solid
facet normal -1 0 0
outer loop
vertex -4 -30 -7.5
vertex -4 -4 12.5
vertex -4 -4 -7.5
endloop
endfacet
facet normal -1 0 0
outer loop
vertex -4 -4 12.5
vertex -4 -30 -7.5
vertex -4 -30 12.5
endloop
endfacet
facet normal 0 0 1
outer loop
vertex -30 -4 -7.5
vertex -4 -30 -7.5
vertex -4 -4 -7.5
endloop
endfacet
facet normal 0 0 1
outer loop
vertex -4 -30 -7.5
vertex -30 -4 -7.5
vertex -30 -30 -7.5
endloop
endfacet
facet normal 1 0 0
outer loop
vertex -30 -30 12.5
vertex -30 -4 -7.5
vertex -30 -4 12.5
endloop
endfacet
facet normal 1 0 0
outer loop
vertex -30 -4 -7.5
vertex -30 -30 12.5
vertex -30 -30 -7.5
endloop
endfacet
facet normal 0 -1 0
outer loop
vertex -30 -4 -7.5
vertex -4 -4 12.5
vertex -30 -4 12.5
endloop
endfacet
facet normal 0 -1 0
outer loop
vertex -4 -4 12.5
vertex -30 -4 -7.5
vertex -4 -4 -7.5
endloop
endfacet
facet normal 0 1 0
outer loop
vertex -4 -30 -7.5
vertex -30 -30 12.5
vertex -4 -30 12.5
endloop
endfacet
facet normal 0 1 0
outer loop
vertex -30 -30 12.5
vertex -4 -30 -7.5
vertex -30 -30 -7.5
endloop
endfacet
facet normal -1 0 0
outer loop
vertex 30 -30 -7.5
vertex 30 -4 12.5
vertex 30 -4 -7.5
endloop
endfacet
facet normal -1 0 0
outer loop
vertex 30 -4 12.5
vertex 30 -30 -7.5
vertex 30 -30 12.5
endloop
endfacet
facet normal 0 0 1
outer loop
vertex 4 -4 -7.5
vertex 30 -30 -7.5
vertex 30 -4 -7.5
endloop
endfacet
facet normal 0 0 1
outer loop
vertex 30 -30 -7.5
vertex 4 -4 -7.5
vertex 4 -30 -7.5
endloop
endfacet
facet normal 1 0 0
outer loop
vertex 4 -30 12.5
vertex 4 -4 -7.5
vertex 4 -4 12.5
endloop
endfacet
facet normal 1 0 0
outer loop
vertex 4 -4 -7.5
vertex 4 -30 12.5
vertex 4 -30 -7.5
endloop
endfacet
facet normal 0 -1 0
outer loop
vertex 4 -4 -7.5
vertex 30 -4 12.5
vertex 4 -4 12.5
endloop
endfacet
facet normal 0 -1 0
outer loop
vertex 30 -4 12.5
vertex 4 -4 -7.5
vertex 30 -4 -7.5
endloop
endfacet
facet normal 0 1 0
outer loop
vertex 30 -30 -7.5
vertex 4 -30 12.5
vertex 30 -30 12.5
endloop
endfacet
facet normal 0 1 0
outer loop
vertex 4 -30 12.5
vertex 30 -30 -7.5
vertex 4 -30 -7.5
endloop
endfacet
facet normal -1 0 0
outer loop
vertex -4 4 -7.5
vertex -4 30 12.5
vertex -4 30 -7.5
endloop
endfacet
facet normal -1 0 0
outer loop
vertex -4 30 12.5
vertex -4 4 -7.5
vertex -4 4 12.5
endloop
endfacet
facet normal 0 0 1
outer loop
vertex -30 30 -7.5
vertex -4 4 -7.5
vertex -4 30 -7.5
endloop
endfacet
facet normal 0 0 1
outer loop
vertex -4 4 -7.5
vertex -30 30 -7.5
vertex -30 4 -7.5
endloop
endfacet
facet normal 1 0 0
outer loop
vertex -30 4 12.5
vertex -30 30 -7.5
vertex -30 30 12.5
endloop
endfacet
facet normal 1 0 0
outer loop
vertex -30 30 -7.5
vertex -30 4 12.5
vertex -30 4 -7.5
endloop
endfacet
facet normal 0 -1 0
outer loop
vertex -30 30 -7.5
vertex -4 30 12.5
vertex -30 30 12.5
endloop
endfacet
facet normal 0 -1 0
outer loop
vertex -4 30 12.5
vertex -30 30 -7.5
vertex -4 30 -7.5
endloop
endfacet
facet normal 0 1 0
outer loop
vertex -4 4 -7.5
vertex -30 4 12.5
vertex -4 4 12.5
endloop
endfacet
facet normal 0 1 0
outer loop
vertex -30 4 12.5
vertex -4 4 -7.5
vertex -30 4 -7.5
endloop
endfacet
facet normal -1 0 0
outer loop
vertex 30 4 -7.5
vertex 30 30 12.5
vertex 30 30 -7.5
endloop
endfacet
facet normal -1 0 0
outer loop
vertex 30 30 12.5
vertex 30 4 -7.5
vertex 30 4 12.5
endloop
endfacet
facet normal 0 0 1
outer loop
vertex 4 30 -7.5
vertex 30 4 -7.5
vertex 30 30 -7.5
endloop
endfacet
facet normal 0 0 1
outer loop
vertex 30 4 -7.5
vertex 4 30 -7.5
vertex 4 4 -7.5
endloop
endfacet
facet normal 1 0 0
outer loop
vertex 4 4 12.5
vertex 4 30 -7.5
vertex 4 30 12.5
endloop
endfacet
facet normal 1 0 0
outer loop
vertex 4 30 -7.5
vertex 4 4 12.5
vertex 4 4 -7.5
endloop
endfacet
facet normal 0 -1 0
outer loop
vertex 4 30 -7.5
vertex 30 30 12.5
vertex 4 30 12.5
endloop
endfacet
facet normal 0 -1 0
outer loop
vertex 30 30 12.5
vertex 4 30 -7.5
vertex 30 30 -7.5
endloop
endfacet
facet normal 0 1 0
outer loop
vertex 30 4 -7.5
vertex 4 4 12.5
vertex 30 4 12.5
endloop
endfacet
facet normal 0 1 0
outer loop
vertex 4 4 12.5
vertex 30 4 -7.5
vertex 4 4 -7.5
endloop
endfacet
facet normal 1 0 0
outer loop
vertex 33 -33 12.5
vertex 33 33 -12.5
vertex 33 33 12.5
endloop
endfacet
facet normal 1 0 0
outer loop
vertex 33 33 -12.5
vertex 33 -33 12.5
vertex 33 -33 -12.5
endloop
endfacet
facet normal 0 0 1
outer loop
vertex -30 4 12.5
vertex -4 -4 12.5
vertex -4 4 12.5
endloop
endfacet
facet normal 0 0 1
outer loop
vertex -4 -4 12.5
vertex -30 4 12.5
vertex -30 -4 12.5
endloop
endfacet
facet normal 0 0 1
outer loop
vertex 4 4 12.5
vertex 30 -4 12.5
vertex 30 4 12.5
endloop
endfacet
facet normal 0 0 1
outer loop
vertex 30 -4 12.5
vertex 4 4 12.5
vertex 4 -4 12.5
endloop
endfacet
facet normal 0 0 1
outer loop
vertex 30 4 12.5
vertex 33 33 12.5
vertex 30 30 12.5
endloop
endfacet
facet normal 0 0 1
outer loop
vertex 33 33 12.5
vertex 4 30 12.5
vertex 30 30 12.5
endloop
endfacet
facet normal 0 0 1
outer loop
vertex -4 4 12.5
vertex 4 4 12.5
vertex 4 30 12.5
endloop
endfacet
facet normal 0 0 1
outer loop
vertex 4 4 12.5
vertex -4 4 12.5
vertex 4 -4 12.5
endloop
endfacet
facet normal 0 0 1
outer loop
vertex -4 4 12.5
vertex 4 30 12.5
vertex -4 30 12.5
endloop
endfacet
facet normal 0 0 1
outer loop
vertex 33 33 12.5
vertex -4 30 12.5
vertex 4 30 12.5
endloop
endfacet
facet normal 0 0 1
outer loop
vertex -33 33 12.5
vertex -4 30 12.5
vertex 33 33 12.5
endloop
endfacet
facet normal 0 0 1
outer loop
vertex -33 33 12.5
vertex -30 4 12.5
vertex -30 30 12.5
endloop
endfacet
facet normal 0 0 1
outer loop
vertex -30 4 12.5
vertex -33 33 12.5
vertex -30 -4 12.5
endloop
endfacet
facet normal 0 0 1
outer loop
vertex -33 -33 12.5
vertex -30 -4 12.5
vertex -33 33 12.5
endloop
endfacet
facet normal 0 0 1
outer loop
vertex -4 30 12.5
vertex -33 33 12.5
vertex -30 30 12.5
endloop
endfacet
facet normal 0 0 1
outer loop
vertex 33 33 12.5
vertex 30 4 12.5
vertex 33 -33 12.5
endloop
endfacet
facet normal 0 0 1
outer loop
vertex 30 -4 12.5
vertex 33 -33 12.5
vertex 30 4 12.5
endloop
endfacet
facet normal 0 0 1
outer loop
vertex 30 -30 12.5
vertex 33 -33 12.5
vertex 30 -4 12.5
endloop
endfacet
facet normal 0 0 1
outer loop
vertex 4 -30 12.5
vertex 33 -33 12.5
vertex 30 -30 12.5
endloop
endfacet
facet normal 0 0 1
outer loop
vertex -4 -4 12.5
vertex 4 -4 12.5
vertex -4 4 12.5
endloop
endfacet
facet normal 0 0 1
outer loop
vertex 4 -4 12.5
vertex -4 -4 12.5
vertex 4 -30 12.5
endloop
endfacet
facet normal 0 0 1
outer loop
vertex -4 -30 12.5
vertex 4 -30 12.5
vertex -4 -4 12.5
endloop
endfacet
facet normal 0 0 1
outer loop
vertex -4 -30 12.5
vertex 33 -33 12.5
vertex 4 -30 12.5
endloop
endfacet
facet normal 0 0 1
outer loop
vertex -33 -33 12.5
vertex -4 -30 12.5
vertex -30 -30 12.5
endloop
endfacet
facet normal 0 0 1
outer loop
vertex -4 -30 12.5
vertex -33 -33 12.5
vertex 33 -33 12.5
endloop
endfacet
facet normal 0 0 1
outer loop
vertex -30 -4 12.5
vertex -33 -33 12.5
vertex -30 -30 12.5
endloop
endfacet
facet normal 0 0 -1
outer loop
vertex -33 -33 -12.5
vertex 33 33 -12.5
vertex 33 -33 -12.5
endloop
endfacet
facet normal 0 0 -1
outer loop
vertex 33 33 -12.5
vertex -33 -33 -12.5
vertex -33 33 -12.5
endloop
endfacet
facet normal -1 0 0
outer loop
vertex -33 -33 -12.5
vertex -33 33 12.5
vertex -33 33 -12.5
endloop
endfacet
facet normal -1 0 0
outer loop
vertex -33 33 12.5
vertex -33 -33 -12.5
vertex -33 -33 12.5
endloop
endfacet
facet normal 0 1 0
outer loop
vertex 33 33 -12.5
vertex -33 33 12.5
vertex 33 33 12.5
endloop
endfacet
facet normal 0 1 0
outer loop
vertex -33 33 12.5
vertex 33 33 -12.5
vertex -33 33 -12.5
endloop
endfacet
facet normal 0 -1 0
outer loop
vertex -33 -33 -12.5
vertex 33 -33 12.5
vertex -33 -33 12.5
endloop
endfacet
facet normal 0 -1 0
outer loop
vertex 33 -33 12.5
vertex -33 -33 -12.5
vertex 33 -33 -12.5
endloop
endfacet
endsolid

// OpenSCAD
$fn = 32;

// ----------------------------------------------------------------------
// Pocket plate 66 x 66 x 25
// 2 x 2 pockets 26 mm square, 20 mm deep
// ----------------------------------------------------------------------

// --- parameters (mm) ---
thickness = 25;  // plate thickness
floor_t = 5;     // material left under each pocket
pocket = 26;     // pocket side length
pitch_x = 34;    // pocket pitch along X
pitch_y = 34;    // pocket pitch along Y
cols = 2;        // pockets per row
rows = 2;        // rows of pockets

// --- derived feature positions (mm) ---
depth = thickness - floor_t;        // = 20   pocket depth, down to the floor
span_x = (cols - 1) * pitch_x;      // = 34   distance between outer pockets
span_y = (rows - 1) * pitch_y;      // = 34   distance between outer pocket rows
origin_x = -span_x / 2;             // = -17   X of the first pocket
origin_y = -span_y / 2;             // = -17   Y of the first pocket
plate = [span_x + pocket + 6, span_y + pocket + 6, thickness];  // = [66, 66, 25]   overall size: pockets plus 3 mm of wall on each side
feature_centers = [
  [origin_x + 0 * pitch_x, origin_y + 0 * pitch_y],
  [origin_x + 1 * pitch_x, origin_y + 0 * pitch_y],
  [origin_x + 0 * pitch_x, origin_y + 1 * pitch_y],
  [origin_x + 1 * pitch_x, origin_y + 1 * pitch_y]
];   // pocket centres, used verbatim by the cutter loop

// plate outline, then one pocket per centre in feature_centers
difference() {
  cube(plate, center = true);
  for (centre = feature_centers)
    translate([centre[0] - pocket / 2, centre[1] - pocket / 2, plate[2] / 2 - depth])
      cube([pocket, pocket, depth + 1]);  // centred on the declared pocket centre
}
